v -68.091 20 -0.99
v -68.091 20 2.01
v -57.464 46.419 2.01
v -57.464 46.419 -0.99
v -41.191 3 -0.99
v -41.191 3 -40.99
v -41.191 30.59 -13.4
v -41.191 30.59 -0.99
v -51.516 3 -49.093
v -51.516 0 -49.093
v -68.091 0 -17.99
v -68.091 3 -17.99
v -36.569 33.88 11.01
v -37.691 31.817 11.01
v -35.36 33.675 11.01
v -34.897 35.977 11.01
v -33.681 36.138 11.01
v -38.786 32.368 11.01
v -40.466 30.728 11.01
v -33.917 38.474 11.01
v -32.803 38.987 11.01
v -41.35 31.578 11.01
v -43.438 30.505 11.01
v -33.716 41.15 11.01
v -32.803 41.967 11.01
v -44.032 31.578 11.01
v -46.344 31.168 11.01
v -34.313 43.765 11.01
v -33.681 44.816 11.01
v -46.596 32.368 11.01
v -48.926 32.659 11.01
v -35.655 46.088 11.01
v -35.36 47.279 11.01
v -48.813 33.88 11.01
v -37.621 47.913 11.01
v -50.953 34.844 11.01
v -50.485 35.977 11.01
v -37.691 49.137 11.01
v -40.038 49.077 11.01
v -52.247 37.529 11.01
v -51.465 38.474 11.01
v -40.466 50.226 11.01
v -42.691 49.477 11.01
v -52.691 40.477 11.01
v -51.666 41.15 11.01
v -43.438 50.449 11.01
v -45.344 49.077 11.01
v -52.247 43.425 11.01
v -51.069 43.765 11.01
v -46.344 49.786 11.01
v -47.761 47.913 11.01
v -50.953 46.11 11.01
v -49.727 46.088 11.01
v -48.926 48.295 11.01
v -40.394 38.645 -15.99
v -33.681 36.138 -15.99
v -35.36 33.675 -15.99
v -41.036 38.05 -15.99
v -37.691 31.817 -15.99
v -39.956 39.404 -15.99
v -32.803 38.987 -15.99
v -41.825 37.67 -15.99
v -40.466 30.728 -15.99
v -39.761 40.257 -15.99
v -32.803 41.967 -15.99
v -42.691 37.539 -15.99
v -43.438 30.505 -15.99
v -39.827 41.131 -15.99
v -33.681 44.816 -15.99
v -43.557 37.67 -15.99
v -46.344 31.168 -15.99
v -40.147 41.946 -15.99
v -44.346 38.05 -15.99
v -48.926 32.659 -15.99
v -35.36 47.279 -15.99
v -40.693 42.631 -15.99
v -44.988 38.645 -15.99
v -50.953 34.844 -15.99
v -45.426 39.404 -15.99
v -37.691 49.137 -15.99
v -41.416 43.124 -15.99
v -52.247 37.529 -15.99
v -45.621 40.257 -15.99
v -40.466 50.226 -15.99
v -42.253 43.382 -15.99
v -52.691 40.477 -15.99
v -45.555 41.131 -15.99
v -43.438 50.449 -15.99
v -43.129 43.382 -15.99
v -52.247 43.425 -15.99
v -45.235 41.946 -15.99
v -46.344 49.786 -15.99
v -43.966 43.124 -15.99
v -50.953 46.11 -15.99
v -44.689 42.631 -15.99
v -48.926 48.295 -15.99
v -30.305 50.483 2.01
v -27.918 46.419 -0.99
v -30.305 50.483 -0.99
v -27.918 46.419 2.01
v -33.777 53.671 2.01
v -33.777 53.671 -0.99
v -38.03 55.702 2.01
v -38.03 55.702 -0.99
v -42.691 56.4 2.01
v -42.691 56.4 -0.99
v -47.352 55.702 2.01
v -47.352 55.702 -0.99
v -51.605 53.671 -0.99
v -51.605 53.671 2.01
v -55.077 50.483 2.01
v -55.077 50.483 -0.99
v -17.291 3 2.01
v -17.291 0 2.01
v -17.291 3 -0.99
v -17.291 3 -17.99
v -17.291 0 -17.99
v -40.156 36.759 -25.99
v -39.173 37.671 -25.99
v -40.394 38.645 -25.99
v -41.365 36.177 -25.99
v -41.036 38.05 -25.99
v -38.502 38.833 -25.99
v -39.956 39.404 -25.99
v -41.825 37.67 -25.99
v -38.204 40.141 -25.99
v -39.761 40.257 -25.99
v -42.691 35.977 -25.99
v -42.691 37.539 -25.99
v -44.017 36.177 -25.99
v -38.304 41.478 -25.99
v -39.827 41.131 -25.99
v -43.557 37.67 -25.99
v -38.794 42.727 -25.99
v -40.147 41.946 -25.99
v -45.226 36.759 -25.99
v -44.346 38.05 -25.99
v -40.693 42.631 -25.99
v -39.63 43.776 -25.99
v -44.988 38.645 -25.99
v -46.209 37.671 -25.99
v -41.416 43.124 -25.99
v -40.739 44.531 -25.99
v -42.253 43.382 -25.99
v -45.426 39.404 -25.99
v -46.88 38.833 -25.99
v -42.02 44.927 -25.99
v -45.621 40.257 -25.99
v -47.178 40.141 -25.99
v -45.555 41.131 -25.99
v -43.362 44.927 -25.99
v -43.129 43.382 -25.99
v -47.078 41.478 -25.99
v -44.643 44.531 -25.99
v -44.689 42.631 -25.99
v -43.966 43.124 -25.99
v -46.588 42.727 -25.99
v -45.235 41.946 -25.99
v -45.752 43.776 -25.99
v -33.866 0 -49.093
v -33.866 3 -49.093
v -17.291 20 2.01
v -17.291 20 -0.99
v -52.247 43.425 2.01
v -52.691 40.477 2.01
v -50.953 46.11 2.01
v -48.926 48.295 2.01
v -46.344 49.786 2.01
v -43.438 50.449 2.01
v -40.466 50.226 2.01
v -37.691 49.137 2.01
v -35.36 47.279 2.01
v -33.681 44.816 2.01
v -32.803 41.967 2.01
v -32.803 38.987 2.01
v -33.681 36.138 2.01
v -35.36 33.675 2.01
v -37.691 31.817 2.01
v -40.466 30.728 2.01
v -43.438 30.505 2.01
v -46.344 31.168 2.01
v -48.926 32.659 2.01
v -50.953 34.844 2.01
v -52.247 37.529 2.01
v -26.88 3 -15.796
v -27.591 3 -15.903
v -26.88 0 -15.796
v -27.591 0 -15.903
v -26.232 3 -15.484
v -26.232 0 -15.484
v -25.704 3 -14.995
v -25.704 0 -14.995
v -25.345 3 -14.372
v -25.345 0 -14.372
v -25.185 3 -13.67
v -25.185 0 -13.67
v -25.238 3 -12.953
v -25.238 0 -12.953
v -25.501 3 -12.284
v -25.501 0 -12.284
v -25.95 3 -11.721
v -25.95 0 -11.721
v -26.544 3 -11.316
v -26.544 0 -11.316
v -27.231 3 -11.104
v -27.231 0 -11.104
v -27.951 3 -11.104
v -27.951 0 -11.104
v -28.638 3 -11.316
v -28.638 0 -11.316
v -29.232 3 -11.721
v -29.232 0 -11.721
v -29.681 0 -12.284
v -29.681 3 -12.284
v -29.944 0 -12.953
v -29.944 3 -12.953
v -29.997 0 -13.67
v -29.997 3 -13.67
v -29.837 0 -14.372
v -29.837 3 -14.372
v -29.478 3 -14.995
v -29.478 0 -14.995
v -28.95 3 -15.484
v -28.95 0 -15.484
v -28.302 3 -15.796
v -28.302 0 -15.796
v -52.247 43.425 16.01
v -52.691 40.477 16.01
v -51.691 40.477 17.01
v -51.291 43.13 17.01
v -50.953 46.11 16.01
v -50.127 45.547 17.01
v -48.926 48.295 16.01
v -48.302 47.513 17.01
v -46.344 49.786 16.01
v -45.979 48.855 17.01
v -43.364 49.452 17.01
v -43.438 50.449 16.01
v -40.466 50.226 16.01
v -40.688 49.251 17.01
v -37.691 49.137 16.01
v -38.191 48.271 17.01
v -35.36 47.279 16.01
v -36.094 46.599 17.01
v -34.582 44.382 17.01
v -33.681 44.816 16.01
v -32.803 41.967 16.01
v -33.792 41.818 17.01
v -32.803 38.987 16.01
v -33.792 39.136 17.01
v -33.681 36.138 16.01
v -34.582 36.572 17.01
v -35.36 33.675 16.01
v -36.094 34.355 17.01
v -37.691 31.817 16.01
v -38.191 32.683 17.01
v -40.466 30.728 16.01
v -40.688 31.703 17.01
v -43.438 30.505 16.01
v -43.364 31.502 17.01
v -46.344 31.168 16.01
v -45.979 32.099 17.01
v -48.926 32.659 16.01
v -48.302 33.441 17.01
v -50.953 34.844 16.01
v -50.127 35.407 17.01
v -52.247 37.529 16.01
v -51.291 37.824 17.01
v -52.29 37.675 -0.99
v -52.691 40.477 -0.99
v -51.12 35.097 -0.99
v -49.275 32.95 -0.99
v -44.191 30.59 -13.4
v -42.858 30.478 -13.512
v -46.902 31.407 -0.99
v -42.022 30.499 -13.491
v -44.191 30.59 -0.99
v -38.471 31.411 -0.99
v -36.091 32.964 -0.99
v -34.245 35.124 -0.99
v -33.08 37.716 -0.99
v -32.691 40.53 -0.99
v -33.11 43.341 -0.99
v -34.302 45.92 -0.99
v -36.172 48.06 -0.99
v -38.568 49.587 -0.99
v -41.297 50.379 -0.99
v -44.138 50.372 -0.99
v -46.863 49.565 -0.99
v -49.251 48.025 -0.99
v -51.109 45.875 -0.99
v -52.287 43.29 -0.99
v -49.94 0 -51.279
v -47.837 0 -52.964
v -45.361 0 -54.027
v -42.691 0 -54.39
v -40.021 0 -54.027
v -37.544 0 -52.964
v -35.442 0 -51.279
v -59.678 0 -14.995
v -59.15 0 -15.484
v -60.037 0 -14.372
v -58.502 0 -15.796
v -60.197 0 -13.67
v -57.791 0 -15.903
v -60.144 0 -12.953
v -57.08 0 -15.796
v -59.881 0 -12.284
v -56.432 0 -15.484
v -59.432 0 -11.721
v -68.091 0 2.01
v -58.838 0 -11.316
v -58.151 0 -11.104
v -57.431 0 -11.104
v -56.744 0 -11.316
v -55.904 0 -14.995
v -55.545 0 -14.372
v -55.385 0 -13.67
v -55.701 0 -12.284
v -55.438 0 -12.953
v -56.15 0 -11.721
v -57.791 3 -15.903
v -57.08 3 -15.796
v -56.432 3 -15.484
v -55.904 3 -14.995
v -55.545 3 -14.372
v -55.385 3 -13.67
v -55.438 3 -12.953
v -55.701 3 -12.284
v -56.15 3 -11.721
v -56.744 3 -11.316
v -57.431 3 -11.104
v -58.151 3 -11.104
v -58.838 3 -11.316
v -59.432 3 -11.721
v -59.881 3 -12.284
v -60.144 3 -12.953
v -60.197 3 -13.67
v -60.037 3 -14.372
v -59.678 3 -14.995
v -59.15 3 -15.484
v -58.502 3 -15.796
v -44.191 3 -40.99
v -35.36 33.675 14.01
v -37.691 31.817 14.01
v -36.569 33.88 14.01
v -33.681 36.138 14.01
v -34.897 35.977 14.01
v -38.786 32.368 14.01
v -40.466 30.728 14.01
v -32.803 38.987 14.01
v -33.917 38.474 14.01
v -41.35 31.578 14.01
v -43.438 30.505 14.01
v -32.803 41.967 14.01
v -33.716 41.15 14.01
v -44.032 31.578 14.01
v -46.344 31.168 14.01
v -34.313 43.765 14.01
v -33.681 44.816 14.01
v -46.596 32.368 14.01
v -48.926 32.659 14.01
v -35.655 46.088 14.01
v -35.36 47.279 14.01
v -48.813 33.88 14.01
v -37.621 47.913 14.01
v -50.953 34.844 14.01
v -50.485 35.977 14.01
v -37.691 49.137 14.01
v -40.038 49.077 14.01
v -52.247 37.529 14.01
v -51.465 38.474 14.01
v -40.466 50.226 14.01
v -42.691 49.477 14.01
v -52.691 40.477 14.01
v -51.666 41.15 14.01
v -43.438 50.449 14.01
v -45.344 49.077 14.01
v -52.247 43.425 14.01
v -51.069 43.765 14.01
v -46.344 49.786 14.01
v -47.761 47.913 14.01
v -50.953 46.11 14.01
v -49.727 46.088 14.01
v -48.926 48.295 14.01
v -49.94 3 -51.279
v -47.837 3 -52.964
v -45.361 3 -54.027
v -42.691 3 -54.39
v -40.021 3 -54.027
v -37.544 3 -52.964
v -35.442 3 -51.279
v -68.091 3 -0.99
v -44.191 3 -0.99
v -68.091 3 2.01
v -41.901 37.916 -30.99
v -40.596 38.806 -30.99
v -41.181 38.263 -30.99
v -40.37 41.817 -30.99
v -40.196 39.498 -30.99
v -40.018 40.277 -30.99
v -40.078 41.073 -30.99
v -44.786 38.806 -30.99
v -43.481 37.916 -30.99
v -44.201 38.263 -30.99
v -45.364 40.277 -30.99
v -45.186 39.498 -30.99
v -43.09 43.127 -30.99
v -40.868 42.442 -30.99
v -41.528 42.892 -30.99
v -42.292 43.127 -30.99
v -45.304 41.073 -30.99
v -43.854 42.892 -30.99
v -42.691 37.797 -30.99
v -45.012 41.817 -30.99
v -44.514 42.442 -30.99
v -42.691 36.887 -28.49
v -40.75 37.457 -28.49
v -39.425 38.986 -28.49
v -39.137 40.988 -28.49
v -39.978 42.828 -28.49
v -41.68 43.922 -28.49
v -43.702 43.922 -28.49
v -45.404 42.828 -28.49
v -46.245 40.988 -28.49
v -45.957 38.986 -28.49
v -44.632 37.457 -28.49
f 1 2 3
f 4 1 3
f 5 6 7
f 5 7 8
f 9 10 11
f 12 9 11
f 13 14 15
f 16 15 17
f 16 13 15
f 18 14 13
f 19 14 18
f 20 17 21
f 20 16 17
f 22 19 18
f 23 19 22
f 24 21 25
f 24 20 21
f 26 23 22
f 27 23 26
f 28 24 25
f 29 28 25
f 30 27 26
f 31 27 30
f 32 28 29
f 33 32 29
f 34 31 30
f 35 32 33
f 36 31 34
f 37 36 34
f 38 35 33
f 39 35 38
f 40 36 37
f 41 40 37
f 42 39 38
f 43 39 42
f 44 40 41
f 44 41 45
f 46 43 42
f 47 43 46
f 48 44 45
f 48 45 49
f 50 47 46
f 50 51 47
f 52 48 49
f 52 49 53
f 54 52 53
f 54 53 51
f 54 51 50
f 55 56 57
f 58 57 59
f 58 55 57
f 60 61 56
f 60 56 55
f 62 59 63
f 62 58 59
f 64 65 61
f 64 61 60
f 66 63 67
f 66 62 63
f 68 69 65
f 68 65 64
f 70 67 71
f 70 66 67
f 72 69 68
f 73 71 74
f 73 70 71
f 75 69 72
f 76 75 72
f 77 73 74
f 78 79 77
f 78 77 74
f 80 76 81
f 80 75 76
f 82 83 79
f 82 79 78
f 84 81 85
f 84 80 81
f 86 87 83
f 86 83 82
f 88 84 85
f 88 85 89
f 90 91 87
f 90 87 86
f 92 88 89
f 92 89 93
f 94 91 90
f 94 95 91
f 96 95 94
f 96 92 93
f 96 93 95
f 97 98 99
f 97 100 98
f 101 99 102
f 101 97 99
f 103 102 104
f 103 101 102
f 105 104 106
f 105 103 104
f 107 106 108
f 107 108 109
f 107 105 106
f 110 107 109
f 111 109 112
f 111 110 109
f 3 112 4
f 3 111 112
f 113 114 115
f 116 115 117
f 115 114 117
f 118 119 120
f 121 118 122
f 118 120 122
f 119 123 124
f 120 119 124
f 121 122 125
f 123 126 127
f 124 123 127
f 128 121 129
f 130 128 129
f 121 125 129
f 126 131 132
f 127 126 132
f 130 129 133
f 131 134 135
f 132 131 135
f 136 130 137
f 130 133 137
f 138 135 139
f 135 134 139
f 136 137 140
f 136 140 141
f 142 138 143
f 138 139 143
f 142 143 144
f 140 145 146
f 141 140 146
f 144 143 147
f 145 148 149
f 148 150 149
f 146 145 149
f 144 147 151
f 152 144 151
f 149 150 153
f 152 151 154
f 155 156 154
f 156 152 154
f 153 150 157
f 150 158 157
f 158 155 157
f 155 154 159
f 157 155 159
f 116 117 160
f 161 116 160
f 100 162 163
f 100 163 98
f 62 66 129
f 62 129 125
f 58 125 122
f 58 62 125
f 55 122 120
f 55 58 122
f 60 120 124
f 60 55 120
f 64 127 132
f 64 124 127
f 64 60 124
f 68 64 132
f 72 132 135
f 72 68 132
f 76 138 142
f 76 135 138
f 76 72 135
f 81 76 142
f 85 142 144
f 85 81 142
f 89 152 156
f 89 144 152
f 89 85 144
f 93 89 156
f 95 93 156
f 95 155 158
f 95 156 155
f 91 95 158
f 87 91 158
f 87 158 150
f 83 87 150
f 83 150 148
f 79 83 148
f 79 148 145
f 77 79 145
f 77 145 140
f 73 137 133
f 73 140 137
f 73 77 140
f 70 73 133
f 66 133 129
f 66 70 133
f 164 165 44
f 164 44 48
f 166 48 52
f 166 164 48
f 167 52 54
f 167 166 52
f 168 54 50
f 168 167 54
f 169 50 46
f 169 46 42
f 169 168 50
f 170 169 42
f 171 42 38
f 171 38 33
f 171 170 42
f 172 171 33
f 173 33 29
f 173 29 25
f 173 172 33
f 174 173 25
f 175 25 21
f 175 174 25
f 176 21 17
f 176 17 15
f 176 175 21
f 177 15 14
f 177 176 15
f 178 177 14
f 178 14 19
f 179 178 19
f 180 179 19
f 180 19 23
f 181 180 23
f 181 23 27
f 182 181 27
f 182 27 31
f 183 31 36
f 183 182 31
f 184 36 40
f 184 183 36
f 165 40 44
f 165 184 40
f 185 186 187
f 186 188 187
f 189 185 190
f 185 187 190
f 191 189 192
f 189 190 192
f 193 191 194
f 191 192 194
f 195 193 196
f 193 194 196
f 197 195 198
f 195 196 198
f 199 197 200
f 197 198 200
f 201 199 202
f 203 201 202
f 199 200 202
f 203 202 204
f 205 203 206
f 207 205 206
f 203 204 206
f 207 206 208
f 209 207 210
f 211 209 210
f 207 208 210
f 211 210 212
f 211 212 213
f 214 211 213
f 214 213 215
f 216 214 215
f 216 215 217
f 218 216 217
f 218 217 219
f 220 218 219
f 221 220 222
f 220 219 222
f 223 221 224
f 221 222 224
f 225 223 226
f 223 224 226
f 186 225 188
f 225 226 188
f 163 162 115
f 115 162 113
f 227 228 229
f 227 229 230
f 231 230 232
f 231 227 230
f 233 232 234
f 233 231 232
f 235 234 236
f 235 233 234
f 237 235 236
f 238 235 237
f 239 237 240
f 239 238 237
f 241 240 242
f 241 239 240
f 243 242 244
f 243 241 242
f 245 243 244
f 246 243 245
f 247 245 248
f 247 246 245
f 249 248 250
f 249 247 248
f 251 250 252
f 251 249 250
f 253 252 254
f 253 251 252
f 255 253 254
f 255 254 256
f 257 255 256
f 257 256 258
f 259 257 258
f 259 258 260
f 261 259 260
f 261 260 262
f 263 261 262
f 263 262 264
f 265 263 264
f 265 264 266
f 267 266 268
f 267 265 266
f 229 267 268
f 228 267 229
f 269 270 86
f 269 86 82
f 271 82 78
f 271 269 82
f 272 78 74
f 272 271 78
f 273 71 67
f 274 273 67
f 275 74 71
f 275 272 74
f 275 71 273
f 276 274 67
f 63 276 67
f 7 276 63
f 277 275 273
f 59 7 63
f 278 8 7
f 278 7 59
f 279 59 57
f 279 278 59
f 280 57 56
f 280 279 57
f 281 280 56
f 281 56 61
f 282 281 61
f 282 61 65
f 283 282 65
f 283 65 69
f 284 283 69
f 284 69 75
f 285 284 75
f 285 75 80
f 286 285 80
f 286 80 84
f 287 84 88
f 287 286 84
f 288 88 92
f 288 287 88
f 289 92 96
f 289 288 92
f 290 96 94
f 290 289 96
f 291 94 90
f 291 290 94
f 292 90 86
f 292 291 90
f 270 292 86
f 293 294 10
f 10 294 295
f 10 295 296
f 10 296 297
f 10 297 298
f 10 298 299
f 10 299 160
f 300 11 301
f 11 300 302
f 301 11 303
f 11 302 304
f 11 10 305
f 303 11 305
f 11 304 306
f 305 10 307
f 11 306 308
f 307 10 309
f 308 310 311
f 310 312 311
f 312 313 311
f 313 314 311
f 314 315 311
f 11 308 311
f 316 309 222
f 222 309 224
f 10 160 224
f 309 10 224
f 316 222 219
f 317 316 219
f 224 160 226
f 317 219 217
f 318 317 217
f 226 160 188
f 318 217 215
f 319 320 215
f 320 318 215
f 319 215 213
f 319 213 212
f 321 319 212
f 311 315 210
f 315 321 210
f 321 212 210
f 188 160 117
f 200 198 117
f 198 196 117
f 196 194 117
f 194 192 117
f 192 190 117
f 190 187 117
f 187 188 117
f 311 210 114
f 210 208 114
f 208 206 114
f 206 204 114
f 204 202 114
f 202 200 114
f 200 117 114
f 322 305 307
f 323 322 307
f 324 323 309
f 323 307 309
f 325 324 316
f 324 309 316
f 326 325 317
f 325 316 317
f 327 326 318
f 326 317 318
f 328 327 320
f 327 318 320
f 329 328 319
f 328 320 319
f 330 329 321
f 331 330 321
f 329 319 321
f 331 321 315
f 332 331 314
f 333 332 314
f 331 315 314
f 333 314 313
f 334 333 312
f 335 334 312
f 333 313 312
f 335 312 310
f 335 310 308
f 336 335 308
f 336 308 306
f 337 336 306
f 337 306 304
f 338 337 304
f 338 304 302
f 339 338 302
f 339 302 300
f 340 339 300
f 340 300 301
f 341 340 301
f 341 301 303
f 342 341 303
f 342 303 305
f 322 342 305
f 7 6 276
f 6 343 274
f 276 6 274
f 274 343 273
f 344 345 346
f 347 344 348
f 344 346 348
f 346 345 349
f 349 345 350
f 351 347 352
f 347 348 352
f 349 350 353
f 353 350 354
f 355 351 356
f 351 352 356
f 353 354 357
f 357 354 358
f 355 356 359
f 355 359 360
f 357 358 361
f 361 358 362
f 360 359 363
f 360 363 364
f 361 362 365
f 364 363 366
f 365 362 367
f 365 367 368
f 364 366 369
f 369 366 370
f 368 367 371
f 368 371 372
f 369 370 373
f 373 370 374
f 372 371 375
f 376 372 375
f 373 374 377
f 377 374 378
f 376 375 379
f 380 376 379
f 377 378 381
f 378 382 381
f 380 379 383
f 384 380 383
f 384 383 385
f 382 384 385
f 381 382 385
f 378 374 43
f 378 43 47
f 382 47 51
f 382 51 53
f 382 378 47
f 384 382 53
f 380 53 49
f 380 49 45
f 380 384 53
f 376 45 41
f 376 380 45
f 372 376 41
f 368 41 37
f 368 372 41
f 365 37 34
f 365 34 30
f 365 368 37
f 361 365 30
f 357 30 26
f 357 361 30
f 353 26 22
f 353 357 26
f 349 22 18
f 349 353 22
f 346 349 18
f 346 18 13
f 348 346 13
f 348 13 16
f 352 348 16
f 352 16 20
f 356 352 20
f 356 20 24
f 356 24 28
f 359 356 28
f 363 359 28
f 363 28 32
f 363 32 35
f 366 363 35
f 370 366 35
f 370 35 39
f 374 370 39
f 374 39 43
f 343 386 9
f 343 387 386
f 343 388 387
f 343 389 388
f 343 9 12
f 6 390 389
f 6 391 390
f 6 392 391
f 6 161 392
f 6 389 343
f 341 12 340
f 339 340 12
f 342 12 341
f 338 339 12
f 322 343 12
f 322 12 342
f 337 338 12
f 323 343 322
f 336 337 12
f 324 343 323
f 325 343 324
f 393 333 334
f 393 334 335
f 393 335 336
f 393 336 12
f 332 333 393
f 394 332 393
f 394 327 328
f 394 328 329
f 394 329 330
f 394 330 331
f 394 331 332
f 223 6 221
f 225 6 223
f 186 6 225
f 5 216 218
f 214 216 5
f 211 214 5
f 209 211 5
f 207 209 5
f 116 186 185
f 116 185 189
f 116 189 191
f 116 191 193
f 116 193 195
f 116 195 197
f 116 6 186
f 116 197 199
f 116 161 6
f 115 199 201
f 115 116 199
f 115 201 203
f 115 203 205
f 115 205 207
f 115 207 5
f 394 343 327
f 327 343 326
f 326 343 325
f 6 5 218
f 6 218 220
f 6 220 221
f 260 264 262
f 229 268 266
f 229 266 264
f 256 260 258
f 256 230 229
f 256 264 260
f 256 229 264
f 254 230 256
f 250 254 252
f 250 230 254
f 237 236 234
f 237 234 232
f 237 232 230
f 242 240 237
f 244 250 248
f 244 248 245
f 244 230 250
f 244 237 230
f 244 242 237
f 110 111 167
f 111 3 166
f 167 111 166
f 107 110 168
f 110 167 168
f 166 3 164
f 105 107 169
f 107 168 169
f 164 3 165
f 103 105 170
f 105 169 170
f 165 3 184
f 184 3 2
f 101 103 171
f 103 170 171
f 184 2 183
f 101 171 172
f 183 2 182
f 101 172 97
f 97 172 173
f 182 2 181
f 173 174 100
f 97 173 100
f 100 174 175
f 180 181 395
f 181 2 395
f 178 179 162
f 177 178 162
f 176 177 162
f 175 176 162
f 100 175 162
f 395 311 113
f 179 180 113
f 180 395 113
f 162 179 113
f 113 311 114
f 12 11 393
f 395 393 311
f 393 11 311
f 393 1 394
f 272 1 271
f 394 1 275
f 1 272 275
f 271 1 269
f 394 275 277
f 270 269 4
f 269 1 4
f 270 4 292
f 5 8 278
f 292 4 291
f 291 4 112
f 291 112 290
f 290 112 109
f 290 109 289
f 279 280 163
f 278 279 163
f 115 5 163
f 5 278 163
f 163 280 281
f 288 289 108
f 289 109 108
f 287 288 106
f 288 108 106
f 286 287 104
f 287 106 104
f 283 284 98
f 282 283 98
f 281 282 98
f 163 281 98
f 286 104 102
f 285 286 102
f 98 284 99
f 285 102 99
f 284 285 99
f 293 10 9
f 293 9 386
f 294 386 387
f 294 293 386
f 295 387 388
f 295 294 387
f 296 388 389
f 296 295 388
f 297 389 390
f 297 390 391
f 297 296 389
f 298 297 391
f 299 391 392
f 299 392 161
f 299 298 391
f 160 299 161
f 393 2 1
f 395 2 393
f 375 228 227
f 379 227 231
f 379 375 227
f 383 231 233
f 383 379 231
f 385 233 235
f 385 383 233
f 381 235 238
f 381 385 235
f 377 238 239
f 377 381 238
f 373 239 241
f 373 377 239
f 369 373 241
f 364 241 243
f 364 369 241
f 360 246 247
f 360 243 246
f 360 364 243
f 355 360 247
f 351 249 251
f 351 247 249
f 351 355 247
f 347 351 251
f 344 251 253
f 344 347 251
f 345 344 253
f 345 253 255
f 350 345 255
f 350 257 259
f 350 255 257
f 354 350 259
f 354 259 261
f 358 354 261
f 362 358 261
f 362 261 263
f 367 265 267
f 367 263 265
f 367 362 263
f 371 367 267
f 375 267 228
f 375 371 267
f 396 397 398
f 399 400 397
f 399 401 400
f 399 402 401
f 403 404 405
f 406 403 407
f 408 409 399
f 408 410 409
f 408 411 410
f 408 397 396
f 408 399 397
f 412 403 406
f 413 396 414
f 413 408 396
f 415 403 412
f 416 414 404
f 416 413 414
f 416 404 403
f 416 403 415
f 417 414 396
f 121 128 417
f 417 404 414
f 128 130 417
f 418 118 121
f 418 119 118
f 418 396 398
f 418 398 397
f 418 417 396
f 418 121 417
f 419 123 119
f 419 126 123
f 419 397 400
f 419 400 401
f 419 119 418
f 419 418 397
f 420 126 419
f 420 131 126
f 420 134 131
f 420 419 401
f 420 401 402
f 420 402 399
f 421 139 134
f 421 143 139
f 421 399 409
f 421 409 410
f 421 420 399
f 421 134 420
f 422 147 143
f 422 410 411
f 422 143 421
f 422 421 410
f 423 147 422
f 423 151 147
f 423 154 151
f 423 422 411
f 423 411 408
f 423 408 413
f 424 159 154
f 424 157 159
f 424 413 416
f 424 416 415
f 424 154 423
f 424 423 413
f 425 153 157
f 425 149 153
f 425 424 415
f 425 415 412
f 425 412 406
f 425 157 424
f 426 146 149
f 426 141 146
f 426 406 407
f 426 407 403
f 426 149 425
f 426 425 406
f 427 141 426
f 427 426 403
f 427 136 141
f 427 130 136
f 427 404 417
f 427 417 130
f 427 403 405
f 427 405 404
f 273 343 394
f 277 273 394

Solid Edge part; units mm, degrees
sketch "Sketch1" plane through (10.8674, 0, 10.8674) normal (0, -1, 0) x (1, 0, 0)
  line L0 (-78.9583, -8.8575) -> (-28.1583, -8.8575)
  line L1 (-28.1583, -8.8575) -> (-28.1583, -28.8575)
  line L2 (-28.1583, -28.8575) -> (-44.7332, -59.9604)
  arc A0 (-62.3834, -59.9604) -> (-44.7332, -59.9604) centre (-53.5583, -55.2575) ccw
  line L3 (-62.3834, -59.9604) -> (-78.9583, -28.8575)
  line L4 (-78.9583, -28.8575) -> (-78.9583, -8.8575)
  dimension "D1" = 50.8
  dimension "D2" = 20
  dimension "D3" = 10
  dimension "D4" = 56.4
extrude "Protrusion1" add sketch "Sketch1" against normal blind 3
sketch "Sketch2" plane through (-42.691, 1.5, 2.0099) normal (0, 0, 1) x (-1, 0, 0)
  line L0 (25.4, 1.5) -> (-25.4, 1.5)
  line L1 (-25.4, -18.5) -> (-25.4, 1.5)
  line L2 (-25.4, -18.5) -> (-14.7727, -44.9193)
  line L3 (25.4, -18.5) -> (14.7727, -44.9193)
  line L4 (25.4, -18.5) -> (25.4, 1.5)
  arc A0 (-14.7727, -44.9193) -> (14.7727, -44.9193) centre (0, -38.977) ccw
  dimension "D1" = 56.4
  dimension "D2" = 20
extrude "Horizontal" add sketch "Sketch2" against normal blind 3
sketch "Sketch3" plane through (-42.691, 56.4, 2.0099) normal (1, 0, 0) x (0, -0.9984256, -0.0560913)
  line L0 (53.4842, 0) -> (55.7279, 39.937)
  line L1 (55.7279, 39.937) -> (13.5472, 2.2437)
  line L2 (53.4842, 0) -> (13.5472, 2.2437)
  dimension "D1" = 40
extrude "Support" add sketch "Sketch3" along normal mid plane 3
sketch "Sketch4" plane through (-42.691, 29.7, -0.9901) normal (0, 0, -1) x (-1, 0, 0)
  circle A0 centre (0, 10.777) radius 10
extrude "Outlet" add sketch "Sketch4" along normal blind 15
sketch "Sketch5" plane through (-42.691, 40.477, -15.9901) normal (0, 0, -1) x (0, -1, 0)
  circle A0 centre (0, 0) radius 2.9378
extrude "OutletThin" add sketch "Sketch5" along normal blind 10
sketch "Sketch6" plane through (-42.691, 40.477, -25.9901) normal (0, 0, -1) x (0, -1, 0)
  circle A0 centre (0, 0) radius 4.5
extrude "OutletValve" add sketch "Sketch6" along normal blind 5 draft 20
sketch "Sketch7" plane through (-42.691, 28.2, 2.0099) normal (0, 0, 1) x (-1, 0, 0)
  circle A0 centre (0, -12.277) radius 10
extrude "Inlet" add sketch "Sketch7" along normal blind 15
sketch "Sketch8" plane through (-42.691, 30.477, 17.0099) normal (-1, 0, 0) x (0, 1, 0)
  line L0 (19, 3) -> (22, 3)
  line L1 (22, 3) -> (22, 6)
  line L2 (22, 6) -> (19, 6)
  line L3 (19, 6) -> (19, 3)
  dimension "D1" = 3
  dimension "D2" = 3
  dimension "D3" = 3
revolve "RevolvedCutout1" cut sketch "Sketch8" angle 360 about axis through (-42.691, 40.477, -30.9901) along (0, 0, 1)
chamfer "InletChamfer" distance 1 angle 45 1 edges at (-32.691, 40.477, 17.0099)
hole "Hole1" at (-57.791, 0, -13.4901) direction (0, 1, 0) diameter 4.826 end up to next
hole "Hole2" at (-27.591, 0, -13.4901) direction (0, 1, 0) diameter 4.826 end up to next
